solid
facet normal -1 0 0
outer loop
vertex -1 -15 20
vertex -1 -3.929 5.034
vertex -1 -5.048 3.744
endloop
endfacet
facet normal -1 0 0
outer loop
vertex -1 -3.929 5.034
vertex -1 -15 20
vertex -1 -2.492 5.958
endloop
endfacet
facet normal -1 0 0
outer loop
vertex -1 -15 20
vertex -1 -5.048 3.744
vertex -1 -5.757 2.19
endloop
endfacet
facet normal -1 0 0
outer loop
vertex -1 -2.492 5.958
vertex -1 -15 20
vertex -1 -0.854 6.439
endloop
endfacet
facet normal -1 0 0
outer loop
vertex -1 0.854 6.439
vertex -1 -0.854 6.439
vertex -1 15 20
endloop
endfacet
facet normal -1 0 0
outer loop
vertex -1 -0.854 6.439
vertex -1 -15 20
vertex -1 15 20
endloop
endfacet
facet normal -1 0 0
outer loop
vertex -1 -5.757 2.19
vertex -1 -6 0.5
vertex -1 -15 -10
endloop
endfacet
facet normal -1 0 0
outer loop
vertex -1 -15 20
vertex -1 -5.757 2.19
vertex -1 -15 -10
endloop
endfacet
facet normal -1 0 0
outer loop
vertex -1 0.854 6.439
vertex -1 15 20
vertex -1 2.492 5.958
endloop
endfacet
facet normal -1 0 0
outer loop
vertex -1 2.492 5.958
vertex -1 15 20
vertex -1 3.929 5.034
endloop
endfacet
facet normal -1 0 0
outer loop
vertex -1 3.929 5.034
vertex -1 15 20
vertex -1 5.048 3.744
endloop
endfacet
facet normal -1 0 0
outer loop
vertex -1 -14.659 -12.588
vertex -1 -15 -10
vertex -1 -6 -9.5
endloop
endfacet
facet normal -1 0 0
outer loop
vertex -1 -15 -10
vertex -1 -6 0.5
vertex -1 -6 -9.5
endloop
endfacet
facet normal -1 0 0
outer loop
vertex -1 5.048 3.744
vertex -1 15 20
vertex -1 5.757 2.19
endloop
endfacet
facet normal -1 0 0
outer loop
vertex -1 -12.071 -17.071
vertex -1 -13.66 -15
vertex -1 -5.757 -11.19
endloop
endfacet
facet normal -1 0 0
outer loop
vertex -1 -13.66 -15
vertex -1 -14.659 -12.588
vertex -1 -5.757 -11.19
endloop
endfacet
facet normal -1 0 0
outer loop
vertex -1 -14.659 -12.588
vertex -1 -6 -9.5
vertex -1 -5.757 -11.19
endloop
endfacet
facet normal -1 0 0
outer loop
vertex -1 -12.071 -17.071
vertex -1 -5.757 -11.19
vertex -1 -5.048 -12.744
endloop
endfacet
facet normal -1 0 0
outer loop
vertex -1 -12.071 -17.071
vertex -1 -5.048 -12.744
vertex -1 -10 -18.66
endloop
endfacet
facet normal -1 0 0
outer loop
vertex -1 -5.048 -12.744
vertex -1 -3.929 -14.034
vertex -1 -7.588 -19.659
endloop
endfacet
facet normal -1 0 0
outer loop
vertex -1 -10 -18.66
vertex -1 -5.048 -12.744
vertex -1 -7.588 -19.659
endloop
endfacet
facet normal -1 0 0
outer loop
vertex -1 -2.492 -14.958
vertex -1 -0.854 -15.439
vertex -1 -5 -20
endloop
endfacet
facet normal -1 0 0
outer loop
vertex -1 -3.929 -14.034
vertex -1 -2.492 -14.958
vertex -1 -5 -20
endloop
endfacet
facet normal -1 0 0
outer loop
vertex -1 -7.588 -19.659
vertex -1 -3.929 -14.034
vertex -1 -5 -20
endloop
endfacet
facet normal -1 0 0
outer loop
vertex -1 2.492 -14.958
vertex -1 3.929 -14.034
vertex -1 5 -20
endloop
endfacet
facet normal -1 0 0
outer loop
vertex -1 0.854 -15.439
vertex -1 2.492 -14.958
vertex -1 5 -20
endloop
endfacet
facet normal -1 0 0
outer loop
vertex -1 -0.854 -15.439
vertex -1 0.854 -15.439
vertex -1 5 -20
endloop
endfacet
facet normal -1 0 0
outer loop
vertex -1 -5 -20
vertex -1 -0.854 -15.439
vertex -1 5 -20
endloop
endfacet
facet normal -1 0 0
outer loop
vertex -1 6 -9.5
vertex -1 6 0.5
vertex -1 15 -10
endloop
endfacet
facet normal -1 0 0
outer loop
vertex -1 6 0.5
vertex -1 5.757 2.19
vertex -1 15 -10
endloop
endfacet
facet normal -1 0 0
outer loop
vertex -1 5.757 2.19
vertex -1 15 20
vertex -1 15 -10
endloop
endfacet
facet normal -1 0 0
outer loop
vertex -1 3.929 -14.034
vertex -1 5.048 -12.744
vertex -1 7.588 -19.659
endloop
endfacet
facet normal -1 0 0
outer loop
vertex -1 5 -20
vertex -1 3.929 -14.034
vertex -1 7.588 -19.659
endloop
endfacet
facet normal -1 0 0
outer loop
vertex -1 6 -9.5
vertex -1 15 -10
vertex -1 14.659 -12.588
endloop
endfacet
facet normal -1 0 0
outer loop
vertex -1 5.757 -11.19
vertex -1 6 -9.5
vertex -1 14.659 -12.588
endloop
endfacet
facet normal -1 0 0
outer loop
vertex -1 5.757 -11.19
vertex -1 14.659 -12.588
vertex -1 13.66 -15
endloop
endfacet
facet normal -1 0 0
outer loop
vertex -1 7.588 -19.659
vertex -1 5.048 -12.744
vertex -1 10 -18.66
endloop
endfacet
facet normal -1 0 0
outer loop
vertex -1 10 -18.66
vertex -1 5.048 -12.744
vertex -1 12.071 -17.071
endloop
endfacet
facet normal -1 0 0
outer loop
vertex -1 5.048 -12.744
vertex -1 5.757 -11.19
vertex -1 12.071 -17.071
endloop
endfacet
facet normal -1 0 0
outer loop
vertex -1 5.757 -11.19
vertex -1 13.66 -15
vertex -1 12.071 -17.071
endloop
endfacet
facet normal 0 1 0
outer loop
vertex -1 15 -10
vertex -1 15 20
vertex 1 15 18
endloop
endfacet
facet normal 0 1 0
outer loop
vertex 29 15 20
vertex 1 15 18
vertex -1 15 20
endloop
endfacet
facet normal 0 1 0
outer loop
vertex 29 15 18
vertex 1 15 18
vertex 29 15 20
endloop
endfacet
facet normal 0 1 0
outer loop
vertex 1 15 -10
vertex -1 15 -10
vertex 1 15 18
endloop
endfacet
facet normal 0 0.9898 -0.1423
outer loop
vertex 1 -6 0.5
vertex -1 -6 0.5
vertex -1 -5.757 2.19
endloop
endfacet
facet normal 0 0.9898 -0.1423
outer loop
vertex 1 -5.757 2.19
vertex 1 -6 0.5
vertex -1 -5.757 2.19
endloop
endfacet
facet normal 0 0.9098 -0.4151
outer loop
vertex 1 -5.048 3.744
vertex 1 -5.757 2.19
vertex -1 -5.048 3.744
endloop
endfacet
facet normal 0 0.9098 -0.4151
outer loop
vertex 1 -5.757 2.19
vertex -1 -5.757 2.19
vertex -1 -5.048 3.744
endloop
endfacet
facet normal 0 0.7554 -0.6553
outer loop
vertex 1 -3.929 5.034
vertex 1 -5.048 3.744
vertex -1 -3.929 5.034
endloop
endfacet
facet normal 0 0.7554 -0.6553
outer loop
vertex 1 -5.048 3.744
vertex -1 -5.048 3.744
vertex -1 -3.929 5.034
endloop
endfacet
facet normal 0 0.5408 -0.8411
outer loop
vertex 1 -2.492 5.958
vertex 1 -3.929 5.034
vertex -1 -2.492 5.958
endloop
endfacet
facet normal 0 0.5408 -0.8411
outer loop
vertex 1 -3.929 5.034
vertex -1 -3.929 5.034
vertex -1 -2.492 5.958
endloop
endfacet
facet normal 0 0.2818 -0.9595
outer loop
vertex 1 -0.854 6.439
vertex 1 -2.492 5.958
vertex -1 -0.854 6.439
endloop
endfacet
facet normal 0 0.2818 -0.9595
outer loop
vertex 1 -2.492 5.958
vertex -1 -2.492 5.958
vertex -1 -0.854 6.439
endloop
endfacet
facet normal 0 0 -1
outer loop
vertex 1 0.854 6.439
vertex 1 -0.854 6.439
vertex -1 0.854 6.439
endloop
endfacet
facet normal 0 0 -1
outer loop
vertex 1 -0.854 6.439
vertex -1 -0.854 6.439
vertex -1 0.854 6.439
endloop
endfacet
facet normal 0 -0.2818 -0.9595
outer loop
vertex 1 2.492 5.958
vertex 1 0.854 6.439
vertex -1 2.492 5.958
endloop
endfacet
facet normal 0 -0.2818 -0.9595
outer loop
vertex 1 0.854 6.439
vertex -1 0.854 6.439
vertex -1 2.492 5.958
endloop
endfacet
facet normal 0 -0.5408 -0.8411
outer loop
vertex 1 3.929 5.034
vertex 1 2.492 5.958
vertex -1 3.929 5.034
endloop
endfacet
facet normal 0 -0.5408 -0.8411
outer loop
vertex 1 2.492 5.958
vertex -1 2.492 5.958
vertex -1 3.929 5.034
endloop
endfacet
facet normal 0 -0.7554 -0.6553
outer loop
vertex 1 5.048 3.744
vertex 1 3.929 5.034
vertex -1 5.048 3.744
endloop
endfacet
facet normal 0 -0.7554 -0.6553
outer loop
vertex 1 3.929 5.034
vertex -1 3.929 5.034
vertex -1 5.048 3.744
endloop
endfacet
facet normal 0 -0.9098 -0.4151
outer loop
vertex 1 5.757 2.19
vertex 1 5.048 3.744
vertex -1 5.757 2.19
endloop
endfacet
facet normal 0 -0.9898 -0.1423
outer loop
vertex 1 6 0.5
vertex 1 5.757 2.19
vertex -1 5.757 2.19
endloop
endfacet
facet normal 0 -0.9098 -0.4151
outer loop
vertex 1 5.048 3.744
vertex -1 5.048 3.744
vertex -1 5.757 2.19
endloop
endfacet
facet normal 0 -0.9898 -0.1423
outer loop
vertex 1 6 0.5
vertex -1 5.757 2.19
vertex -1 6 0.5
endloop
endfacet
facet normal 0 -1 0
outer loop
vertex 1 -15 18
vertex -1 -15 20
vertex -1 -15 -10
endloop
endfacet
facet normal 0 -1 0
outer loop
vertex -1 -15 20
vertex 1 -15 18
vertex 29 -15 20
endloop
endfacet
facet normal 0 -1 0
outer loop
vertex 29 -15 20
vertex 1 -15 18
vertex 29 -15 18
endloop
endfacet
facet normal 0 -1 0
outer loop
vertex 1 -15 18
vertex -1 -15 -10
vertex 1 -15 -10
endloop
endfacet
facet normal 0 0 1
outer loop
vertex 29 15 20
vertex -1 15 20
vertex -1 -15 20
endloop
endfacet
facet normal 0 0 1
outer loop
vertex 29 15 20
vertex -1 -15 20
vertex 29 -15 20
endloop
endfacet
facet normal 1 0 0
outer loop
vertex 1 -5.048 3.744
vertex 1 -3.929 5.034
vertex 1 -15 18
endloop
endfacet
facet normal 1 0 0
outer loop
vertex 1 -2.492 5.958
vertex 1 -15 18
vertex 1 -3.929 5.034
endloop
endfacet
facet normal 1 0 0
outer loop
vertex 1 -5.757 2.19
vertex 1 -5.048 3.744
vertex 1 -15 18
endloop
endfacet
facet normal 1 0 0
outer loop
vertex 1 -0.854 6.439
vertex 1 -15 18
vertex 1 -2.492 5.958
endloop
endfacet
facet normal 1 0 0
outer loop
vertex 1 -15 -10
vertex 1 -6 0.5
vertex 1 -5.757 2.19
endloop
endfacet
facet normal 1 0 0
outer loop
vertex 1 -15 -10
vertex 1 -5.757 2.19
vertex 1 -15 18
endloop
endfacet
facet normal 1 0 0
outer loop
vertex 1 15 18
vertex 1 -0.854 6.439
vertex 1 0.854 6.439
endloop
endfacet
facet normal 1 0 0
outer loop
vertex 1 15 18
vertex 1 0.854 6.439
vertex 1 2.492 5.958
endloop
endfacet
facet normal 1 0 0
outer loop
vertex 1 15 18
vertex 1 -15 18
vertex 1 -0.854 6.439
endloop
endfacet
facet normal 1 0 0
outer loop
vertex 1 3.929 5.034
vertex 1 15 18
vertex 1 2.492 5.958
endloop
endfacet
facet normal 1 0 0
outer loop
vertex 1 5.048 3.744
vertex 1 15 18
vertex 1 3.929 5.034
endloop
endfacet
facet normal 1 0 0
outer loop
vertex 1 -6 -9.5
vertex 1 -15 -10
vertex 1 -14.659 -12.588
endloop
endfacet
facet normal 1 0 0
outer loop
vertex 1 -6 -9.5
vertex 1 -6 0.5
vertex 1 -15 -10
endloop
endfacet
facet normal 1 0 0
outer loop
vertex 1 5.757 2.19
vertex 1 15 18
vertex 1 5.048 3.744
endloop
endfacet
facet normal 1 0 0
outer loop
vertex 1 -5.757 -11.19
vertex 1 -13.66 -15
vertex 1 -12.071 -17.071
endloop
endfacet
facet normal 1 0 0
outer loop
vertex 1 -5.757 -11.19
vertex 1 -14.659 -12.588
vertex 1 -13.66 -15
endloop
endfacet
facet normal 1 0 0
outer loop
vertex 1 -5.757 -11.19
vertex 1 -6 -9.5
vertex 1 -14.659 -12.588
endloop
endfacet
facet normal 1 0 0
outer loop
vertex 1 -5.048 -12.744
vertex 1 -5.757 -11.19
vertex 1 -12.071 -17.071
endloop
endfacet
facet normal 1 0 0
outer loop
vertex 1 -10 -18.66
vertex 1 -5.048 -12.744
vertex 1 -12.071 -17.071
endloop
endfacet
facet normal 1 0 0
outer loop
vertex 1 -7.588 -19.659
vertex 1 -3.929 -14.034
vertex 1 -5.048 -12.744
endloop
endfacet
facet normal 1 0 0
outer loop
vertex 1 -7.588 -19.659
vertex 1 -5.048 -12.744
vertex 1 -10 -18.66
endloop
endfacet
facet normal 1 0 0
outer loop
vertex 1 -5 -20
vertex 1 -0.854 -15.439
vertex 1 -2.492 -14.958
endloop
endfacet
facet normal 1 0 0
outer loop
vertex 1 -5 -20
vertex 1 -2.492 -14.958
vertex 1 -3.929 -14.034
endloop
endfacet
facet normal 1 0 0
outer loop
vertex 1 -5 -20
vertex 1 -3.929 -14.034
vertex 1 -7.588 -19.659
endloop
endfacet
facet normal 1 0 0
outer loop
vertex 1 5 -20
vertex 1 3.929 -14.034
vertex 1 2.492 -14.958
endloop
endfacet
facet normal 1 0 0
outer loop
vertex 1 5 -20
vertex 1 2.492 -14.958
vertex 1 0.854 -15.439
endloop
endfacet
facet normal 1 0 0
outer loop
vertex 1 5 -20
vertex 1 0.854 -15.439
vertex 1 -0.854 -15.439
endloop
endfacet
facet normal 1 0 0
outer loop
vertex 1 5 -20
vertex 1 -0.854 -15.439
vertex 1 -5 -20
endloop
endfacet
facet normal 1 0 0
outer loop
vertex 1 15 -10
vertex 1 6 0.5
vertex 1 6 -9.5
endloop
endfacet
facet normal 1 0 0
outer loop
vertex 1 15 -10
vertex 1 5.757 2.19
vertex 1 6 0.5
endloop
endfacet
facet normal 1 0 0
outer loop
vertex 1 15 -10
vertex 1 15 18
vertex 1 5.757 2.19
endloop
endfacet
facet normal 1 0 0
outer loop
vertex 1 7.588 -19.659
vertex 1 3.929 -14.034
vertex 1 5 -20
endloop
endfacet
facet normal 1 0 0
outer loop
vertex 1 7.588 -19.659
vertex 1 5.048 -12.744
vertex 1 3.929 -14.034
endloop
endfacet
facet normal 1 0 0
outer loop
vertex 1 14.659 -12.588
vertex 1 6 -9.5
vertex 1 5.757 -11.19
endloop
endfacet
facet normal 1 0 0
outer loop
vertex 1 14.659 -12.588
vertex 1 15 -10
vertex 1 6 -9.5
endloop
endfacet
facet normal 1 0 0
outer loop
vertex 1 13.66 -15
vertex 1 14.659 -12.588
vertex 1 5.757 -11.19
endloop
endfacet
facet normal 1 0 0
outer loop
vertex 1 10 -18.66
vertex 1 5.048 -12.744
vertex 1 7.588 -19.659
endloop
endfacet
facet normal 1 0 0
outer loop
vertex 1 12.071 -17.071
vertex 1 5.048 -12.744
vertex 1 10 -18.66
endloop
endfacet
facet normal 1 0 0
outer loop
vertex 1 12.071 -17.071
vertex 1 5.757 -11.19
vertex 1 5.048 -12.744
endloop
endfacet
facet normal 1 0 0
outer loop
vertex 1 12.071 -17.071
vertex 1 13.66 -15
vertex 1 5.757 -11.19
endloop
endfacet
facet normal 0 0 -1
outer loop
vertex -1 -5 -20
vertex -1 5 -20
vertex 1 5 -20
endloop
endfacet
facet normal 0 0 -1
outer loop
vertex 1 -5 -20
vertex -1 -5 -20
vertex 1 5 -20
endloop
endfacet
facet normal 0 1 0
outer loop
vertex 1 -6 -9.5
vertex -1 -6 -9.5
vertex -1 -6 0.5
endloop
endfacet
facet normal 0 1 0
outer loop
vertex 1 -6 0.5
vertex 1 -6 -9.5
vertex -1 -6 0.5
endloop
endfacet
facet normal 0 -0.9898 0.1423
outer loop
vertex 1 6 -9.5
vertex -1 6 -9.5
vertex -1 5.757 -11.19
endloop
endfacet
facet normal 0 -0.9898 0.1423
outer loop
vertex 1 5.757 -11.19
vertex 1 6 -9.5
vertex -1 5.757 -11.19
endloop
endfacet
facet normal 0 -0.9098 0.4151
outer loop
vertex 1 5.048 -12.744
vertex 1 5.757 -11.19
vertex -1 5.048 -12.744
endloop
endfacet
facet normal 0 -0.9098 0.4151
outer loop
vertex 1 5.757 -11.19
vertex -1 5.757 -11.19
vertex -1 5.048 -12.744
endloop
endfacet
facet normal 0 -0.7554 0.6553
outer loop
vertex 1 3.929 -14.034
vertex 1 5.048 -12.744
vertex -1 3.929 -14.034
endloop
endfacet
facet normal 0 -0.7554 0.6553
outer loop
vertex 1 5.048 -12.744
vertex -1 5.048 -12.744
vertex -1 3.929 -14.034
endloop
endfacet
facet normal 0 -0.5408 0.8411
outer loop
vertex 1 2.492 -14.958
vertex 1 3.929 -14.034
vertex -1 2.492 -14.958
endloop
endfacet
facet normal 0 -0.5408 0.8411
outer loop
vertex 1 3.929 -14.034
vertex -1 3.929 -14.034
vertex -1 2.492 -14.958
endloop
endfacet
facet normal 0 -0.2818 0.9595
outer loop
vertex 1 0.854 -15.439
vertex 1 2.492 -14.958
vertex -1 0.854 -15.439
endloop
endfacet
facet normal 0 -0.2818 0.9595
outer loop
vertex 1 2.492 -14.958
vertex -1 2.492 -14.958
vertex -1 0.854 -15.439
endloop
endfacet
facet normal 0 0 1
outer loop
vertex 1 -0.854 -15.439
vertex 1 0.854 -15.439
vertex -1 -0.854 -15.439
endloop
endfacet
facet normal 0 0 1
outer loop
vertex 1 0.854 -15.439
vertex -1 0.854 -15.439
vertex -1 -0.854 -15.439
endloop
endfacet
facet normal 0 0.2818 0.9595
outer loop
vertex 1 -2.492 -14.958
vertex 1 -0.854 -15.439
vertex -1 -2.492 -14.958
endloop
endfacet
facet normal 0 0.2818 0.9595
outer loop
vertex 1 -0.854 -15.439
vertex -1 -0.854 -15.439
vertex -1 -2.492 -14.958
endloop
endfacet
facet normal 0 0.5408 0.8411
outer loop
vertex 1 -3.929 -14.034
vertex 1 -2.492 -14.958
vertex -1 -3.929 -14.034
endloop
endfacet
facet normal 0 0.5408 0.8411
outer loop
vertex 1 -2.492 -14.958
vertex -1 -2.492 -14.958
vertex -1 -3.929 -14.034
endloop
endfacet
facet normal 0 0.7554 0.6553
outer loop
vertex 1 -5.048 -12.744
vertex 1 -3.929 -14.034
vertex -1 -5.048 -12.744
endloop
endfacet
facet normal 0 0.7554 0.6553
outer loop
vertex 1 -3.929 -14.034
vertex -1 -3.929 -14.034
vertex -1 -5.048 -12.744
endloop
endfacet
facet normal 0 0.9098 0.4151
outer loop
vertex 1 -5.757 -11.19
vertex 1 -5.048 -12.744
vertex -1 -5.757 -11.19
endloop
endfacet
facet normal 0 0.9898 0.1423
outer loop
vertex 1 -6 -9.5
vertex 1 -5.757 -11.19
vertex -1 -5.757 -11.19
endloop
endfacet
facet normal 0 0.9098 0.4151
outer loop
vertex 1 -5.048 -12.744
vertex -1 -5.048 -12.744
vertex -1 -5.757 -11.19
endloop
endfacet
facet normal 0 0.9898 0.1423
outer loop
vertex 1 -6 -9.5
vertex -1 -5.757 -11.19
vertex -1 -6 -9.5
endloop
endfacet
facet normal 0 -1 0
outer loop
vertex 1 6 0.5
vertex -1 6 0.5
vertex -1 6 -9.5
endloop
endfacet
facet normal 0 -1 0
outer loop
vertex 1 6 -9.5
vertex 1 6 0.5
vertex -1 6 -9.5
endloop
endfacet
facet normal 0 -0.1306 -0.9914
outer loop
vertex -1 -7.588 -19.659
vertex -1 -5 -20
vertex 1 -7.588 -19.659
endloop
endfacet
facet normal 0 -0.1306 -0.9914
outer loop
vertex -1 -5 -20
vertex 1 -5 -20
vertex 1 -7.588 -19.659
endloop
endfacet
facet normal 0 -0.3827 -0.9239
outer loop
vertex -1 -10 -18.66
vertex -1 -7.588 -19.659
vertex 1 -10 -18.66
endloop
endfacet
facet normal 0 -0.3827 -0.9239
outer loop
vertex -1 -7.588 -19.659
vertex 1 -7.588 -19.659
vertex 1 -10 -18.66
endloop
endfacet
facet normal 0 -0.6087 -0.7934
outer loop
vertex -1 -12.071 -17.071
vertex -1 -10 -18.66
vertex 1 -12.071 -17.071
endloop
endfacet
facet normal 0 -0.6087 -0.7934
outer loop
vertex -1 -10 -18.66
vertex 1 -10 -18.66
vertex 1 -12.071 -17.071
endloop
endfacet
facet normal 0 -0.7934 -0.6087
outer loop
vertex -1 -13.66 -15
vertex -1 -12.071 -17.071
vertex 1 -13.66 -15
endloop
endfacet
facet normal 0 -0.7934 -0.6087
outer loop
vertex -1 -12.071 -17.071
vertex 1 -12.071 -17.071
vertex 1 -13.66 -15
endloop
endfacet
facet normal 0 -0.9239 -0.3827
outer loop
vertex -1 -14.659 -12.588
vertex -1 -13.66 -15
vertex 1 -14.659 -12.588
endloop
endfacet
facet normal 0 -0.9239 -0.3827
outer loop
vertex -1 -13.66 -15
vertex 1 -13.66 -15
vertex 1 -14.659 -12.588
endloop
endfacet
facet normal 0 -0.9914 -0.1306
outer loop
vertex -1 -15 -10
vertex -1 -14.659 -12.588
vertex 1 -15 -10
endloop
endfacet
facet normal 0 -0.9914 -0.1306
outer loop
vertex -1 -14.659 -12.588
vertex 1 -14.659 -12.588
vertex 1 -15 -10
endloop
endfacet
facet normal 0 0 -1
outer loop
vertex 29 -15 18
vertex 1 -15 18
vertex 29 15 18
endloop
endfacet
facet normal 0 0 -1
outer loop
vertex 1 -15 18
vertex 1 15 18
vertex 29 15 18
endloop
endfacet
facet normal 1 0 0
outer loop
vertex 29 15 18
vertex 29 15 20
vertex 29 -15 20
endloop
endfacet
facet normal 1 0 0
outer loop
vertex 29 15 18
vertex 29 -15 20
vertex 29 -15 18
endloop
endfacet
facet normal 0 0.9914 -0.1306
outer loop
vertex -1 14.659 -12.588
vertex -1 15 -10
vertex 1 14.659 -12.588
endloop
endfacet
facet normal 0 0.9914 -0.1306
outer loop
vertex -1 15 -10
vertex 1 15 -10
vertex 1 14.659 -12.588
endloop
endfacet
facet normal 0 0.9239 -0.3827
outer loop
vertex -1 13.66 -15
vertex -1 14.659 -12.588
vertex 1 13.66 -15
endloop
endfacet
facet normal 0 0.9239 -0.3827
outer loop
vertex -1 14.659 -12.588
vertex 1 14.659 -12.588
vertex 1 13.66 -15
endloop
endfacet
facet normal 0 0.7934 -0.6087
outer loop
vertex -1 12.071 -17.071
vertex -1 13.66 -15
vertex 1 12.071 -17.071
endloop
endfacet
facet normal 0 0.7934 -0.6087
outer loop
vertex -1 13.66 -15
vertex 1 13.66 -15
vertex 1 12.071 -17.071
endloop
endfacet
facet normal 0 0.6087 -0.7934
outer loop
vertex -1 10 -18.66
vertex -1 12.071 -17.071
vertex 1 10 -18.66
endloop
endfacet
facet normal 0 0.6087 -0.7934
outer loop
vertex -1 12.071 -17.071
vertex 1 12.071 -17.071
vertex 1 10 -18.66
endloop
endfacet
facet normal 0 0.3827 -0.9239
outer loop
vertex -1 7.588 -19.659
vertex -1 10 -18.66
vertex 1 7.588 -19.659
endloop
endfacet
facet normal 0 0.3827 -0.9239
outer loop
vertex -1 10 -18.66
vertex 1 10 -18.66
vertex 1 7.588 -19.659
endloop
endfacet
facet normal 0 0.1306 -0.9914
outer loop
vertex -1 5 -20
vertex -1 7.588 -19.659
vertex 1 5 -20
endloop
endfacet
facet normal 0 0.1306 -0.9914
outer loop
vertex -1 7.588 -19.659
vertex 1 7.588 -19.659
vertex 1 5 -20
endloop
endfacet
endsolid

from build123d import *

# Parameters (mm, degrees)
SKETCH_1_W               = 2
SKETCH_1_H               = 40
SKETCH_1_W_2             = 28
SKETCH_1_H_2             = 2
EXTRUDE_1_DEPTH          = 15
FILLET_1_R               = 10
CUT_EXTRUDE_1_DEPTH      = 38.536648758
CUT_EXTRUDE_1_DEPTH_BACK = 38.536648758


with BuildPart() as part:
    # 草图1 → 凸台-拉伸1 (new, symmetric)
    with BuildSketch(Plane(origin=(0, 0, 0), x_dir=(1, 0, 0), z_dir=(0, 1, 0))):
        Rectangle(SKETCH_1_W, SKETCH_1_H)
        with Locations((15, -19)):
            Rectangle(SKETCH_1_W_2, SKETCH_1_H_2)
    extrude(amount=EXTRUDE_1_DEPTH, both=True)

    # 圆角1
    fillet_1_edges = [part.edges().sort_by_distance(p)[0] for p in [
        (0, 15, -20),
        (0, -15, -20),
    ]]
    fillet(fillet_1_edges, radius=FILLET_1_R)

    # 草图2 → 切除-拉伸1 (cut, two sides: drawn at the far end of the back side and taken through both)
    with BuildSketch(Plane(origin=(1, 0, 0), x_dir=(0, 0, -1), z_dir=(1, 0, 0)).offset(-CUT_EXTRUDE_1_DEPTH_BACK)):
        with BuildLine():
            Line((-0.5, 6), (9.5, 6))
            ThreePointArc((9.5, 6), (15.5, 0), (9.5, -6))
            Line((9.5, -6), (-0.5, -6))
            ThreePointArc((-0.5, -6), (-6.5, 0), (-0.5, 6))
        make_face()
    extrude(amount=CUT_EXTRUDE_1_DEPTH + CUT_EXTRUDE_1_DEPTH_BACK, mode=Mode.SUBTRACT)


solid = part.part
